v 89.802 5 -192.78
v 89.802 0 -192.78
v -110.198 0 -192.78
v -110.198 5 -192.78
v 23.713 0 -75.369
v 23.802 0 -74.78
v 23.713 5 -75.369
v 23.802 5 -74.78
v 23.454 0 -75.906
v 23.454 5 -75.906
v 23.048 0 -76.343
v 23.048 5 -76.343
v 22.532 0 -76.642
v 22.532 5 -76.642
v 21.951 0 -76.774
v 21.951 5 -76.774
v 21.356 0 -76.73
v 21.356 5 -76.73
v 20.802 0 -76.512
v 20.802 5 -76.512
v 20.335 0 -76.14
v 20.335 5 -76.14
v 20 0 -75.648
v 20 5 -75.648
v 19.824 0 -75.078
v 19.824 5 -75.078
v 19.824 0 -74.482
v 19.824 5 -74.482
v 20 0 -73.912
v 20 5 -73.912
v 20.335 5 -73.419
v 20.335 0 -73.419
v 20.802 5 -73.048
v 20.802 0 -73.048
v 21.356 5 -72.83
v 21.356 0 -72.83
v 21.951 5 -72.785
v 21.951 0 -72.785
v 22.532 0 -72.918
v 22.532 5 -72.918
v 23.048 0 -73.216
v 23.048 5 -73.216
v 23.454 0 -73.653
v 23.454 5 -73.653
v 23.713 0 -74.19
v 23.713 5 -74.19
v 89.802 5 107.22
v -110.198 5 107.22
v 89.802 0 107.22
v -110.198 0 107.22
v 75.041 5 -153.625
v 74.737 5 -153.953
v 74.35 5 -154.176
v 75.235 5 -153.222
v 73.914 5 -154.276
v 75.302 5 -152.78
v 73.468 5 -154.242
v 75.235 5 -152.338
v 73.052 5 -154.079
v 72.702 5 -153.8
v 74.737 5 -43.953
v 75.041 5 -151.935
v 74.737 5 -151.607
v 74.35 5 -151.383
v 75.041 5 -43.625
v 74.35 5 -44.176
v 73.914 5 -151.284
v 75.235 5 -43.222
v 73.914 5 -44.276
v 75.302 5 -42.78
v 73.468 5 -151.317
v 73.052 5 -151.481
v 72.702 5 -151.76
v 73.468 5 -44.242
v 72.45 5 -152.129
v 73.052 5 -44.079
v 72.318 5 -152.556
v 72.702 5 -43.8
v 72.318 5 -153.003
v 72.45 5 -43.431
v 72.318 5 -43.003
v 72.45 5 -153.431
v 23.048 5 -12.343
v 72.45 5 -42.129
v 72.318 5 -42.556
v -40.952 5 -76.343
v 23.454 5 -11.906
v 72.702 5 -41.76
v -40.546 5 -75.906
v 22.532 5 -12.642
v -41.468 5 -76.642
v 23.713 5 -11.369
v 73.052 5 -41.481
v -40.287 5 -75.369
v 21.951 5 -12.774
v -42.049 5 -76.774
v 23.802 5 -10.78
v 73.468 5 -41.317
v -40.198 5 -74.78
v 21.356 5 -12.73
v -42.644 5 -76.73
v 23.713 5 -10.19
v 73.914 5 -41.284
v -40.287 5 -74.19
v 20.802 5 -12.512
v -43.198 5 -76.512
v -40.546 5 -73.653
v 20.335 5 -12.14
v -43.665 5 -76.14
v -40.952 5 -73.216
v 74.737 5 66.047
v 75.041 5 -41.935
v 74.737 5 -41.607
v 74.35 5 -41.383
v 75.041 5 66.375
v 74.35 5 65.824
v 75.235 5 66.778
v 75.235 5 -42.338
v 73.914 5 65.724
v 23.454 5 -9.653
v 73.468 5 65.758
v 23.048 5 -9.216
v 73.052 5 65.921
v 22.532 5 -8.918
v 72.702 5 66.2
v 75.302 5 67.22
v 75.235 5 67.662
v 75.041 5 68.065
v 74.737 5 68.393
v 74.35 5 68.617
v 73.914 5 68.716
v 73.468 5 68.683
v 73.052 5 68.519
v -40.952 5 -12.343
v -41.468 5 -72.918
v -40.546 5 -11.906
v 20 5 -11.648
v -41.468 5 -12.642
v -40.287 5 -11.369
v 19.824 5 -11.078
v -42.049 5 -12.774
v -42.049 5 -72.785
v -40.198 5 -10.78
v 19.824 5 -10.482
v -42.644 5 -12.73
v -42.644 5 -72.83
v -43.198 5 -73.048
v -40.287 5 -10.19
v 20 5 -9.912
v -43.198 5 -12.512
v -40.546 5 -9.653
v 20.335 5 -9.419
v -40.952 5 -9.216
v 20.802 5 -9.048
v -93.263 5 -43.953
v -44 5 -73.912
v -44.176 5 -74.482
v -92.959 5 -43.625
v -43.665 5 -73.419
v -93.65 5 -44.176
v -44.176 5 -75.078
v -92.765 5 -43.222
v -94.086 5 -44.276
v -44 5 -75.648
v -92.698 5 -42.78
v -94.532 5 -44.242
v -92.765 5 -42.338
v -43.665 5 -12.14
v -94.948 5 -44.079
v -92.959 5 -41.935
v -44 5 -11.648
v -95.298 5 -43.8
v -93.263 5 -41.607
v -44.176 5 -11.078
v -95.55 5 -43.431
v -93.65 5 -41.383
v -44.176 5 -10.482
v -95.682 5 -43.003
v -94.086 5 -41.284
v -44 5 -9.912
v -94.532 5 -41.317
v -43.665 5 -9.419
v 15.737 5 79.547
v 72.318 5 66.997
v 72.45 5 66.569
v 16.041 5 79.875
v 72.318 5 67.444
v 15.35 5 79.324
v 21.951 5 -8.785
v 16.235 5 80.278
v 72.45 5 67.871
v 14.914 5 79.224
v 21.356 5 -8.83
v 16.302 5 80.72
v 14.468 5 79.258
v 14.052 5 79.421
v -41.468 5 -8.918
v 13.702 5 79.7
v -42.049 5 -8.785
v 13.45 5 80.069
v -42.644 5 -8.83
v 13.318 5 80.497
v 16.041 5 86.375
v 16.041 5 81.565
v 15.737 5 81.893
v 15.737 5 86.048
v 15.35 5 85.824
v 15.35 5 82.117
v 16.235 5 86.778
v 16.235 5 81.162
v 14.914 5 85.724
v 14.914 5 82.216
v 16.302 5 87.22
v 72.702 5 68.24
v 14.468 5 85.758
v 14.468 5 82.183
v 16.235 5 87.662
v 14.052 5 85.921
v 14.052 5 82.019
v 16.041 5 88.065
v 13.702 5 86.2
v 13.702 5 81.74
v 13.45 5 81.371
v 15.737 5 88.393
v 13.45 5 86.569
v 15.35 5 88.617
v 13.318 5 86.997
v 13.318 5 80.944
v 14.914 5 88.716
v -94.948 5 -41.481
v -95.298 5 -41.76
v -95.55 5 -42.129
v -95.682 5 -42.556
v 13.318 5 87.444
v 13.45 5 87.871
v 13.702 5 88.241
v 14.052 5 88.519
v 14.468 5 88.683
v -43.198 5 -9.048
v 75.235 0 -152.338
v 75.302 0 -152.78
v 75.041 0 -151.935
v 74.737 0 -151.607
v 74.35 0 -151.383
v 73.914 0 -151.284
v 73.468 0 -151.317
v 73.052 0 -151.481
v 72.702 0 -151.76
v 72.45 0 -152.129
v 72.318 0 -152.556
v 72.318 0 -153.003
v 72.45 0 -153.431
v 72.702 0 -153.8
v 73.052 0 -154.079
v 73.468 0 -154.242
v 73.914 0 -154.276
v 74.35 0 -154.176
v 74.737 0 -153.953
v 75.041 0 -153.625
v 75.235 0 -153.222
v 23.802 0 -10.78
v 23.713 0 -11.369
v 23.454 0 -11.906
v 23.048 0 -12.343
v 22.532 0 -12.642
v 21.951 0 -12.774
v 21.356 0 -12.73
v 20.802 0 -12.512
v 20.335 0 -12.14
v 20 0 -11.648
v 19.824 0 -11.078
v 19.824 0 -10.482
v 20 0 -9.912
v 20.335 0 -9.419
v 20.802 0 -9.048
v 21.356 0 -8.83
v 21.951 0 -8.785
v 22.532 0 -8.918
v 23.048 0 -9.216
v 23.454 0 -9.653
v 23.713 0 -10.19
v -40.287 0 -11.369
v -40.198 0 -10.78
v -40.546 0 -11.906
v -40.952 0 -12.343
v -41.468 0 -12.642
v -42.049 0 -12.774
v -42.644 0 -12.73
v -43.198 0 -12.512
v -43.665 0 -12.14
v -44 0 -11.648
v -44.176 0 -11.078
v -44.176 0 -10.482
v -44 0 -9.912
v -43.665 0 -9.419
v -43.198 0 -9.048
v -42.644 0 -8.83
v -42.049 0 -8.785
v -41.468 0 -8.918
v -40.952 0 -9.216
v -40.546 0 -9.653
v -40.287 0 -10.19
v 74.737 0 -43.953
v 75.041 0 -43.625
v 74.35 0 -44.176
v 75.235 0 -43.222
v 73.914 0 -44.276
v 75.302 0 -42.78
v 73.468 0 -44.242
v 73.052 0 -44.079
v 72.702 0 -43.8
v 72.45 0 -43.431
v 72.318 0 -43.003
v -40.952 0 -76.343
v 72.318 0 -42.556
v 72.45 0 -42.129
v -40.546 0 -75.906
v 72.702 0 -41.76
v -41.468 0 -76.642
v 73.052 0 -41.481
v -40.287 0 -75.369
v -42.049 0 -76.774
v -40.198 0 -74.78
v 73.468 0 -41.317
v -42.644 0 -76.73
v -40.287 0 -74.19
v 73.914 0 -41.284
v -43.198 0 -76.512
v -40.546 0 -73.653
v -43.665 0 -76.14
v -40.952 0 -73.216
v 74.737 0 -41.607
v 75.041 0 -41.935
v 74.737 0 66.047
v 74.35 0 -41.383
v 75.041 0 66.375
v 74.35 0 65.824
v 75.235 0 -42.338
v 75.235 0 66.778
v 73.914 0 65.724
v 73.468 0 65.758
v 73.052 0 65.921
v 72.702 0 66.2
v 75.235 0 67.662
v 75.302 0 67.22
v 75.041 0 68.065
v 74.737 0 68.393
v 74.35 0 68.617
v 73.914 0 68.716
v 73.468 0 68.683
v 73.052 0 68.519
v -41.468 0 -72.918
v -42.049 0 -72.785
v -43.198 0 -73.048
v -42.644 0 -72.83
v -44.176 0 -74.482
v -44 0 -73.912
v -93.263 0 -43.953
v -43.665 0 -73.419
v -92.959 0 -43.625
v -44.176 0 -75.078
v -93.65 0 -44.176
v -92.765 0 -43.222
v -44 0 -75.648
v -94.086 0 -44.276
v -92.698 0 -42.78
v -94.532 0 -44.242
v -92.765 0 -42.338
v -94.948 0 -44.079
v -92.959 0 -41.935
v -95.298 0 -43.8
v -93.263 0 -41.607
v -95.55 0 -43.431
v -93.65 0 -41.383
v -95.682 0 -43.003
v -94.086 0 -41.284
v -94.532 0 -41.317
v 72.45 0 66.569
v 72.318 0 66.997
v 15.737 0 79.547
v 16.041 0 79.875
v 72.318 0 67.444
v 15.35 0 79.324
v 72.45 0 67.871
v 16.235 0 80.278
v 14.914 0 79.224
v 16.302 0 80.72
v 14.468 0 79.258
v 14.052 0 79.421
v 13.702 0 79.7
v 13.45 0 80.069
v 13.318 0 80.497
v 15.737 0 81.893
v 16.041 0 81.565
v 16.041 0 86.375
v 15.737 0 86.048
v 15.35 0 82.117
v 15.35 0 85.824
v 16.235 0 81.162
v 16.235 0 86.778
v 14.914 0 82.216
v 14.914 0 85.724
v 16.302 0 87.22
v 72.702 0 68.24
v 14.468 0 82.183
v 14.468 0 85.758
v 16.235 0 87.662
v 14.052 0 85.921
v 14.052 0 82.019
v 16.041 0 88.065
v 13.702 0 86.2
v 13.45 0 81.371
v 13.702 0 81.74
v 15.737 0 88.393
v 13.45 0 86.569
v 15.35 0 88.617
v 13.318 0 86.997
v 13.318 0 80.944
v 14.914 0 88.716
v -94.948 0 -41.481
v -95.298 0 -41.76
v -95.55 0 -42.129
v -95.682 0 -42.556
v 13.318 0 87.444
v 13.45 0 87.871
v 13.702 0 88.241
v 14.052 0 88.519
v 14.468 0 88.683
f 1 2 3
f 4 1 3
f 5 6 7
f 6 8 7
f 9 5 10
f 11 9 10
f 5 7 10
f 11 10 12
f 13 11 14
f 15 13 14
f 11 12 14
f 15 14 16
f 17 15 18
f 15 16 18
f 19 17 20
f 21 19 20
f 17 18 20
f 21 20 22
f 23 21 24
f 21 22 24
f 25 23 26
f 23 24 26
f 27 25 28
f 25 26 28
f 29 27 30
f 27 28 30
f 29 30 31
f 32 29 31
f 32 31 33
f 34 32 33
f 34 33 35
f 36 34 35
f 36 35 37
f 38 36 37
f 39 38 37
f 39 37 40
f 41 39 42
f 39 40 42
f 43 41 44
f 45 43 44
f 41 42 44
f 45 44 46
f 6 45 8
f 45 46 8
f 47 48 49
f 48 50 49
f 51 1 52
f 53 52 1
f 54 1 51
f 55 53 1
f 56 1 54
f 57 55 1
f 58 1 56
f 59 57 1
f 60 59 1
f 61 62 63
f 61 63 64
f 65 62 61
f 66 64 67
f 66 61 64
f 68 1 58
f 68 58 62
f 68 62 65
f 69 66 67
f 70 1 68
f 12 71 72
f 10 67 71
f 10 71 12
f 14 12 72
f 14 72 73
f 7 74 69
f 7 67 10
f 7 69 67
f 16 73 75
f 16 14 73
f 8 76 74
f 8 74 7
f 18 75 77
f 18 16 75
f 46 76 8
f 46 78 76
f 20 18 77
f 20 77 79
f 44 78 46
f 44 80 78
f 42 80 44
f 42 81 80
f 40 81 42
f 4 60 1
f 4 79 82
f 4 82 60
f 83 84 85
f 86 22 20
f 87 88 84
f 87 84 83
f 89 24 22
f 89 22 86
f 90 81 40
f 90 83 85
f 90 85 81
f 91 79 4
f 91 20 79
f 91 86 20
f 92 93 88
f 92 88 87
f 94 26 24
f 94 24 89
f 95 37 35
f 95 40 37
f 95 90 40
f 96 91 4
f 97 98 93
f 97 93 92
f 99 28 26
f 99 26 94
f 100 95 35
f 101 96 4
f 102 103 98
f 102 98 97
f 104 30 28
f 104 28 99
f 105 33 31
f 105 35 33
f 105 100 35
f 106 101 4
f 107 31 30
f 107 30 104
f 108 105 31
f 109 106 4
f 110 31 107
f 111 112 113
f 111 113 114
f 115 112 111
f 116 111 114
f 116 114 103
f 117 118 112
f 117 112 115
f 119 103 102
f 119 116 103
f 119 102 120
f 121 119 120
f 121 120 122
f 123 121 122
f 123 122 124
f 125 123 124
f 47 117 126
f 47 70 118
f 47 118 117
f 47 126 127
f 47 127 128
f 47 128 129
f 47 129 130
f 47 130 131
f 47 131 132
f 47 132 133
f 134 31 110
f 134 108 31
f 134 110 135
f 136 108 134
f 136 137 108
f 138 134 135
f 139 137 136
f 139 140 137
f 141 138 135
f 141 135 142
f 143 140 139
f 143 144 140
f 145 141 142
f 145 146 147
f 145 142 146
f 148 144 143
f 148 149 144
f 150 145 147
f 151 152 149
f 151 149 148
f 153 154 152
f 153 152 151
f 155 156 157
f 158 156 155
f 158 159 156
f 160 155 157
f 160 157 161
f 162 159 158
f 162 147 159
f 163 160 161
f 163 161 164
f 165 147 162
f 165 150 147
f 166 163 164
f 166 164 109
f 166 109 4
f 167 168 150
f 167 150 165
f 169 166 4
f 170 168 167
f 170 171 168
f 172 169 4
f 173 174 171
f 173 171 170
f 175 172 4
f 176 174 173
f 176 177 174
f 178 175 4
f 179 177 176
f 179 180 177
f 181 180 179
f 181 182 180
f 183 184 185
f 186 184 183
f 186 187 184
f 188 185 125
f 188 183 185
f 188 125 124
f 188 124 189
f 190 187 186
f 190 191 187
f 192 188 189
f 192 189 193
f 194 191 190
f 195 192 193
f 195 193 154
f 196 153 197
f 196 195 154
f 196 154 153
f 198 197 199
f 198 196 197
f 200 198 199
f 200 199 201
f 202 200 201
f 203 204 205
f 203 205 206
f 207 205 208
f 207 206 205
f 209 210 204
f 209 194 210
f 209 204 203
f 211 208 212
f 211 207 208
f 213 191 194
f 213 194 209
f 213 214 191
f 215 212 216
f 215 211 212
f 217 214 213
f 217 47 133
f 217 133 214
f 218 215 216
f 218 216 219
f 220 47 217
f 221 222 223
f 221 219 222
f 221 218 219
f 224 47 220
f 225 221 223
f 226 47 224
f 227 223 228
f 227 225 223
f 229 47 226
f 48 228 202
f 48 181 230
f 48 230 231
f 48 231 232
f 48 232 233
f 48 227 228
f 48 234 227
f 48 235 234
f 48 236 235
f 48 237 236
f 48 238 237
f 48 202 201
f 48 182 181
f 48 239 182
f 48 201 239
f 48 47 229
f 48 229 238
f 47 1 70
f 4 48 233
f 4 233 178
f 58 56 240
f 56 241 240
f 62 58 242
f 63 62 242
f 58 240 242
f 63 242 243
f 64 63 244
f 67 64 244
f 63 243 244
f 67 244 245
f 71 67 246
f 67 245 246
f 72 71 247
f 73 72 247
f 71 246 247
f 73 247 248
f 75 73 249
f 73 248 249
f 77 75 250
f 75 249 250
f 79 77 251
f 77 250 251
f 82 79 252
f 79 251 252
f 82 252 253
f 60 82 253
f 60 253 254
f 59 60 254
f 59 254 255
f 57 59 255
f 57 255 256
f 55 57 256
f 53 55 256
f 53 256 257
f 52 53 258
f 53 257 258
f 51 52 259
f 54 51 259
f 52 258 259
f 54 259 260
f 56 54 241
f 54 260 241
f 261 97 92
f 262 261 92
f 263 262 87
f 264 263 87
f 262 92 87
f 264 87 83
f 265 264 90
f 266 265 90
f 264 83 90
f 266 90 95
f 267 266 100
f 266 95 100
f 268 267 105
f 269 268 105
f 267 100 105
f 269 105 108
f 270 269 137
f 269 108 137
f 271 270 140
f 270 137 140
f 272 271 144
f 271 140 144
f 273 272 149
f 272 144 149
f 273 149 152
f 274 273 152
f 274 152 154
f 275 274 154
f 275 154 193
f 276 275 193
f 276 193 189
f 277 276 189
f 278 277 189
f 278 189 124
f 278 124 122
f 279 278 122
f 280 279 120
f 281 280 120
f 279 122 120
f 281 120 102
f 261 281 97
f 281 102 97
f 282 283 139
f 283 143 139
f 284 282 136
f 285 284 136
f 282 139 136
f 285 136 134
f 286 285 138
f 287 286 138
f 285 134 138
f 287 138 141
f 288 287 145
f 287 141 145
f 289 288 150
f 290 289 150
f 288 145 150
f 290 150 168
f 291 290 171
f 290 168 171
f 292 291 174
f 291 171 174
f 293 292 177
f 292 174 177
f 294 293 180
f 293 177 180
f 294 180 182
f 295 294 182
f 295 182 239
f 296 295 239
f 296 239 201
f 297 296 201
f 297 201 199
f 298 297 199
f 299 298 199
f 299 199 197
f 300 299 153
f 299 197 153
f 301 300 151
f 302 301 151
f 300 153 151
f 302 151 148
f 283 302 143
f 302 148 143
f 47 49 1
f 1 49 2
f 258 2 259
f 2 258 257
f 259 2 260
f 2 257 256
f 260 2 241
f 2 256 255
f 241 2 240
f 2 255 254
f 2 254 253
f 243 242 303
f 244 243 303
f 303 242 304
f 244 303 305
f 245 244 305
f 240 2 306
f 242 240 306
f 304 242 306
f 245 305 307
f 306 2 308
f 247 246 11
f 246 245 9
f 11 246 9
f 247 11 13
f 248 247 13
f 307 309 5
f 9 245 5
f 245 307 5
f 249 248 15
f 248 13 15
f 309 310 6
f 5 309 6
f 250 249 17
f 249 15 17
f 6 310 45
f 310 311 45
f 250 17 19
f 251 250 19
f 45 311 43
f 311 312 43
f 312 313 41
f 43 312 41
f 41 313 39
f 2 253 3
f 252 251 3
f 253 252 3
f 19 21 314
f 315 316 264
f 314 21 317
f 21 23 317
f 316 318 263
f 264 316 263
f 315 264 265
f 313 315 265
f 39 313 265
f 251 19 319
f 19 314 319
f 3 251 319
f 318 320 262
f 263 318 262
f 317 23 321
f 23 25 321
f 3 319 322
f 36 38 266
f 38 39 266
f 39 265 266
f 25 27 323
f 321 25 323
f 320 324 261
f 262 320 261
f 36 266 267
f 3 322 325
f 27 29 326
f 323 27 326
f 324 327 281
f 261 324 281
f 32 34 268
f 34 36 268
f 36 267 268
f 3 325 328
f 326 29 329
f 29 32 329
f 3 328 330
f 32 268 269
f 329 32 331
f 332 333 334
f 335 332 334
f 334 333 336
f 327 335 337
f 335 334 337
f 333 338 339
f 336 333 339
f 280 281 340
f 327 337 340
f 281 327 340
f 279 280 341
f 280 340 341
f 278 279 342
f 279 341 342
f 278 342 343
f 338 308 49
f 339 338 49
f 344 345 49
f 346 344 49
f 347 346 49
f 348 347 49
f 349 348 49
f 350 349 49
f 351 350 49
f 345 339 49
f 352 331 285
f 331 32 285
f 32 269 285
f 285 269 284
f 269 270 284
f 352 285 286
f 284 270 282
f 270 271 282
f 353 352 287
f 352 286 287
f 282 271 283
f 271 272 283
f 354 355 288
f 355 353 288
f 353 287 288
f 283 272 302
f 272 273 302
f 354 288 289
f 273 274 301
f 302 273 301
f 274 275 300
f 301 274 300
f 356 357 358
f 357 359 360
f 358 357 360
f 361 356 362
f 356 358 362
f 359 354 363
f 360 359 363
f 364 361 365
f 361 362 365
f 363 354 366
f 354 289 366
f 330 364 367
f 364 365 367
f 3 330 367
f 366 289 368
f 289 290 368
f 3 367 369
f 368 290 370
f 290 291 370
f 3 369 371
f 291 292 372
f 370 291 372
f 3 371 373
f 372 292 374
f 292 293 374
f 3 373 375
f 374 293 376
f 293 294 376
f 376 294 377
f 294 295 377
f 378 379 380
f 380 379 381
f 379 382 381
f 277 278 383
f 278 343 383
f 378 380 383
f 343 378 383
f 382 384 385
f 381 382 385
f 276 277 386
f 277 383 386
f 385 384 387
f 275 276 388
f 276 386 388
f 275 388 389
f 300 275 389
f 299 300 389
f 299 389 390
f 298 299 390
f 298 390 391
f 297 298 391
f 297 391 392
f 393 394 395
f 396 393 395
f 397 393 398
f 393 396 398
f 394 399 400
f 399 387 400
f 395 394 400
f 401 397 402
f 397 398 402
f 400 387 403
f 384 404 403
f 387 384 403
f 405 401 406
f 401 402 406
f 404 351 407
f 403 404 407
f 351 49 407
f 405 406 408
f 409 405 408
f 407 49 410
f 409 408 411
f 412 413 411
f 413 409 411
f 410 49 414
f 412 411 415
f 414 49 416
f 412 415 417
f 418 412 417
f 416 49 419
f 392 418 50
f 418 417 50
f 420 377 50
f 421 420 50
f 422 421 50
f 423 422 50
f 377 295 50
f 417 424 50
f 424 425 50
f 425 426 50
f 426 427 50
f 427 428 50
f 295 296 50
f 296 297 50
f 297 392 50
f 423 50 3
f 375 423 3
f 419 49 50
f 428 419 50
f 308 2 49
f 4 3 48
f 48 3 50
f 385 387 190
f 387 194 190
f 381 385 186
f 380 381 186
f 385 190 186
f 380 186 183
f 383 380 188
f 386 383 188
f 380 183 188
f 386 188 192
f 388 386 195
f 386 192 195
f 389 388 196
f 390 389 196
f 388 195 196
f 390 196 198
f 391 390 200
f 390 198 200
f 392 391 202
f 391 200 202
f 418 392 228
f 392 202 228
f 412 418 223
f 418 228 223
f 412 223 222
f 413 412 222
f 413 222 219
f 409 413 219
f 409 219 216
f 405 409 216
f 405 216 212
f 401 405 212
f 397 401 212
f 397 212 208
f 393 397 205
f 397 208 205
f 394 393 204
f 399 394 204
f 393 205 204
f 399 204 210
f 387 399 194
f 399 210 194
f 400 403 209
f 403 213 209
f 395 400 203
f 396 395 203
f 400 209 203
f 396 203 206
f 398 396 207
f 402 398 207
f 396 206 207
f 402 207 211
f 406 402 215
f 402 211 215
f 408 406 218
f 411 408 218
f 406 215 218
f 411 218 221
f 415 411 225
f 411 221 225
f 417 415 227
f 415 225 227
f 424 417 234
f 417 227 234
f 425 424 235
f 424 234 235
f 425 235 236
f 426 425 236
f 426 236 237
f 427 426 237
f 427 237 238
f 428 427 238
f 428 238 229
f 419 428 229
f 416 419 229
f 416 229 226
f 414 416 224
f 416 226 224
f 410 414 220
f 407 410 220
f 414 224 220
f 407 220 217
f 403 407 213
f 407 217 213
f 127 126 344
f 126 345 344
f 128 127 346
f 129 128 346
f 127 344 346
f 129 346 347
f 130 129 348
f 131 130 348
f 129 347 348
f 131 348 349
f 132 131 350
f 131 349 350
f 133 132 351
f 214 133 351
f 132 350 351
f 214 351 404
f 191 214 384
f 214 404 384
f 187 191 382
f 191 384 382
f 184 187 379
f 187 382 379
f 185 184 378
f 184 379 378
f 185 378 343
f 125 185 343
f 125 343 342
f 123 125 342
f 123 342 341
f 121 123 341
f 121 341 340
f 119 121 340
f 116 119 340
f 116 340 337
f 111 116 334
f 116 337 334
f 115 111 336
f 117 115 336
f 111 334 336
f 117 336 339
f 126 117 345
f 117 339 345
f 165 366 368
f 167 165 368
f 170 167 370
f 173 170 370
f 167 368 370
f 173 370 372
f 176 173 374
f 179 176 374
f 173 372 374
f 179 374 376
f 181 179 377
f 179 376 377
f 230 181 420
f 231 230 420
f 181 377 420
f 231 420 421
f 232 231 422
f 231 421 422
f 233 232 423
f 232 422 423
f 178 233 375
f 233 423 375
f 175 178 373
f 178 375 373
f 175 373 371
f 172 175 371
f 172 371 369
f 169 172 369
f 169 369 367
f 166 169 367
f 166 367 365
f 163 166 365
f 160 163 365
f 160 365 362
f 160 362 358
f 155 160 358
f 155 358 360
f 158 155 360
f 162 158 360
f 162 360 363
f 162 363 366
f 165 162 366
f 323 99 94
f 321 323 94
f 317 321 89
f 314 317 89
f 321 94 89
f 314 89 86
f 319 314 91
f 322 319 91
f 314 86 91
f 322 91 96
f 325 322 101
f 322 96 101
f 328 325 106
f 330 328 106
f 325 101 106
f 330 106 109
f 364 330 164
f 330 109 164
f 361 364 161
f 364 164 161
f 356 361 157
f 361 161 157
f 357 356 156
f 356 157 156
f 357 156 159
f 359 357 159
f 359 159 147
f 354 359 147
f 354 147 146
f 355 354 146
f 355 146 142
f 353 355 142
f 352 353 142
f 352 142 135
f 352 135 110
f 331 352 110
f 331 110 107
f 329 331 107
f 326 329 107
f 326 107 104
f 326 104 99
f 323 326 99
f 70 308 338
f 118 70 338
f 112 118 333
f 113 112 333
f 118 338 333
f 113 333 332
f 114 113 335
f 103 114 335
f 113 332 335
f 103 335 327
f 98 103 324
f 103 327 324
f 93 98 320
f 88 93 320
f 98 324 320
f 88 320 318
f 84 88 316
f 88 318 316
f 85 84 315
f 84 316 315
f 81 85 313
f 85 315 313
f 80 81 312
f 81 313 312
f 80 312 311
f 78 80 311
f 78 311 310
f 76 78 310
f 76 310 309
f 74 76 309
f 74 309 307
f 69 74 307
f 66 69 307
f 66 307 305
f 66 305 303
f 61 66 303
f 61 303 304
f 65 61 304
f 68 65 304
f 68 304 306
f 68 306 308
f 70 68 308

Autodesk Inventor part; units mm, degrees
ref_plane "YZ Plane" through (0, 0, 0) normal (1, 0, 0) x (0, 1, 0)
ref_plane "XZ Plane" through (0, 0, 0) normal (0, 1, 0) x (-1, 0, 0)
ref_plane "XY Plane" through (0, 0, 0) normal (0, 0, 1) x (1, 0, 0)
sketch "Esquisse1" plane through (0, 0, 0) normal (0, 1, 0) x (-1, 0, 0)
  line L0 (110.1985, 107.2202) -> (-89.8015, 107.2202)
  line L1 (-89.8015, 107.2202) -> (-89.8015, -192.7798)
  line L2 (-89.8015, -192.7798) -> (110.1985, -192.7798)
  line L3 (110.1985, -192.7798) -> (110.1985, 107.2202)
  point P0 (0, 0)
  dimension "d0" = 300
  dimension "d1" = 200
extrude "Extrusion1" add sketch "Esquisse1" along normal blind 5
sketch "Esquisse2" plane through (0, 0, 0) normal (0, -1, 0) x (1, 0, 0)
  circle A0 centre (-94.1985, -42.7798) radius 1.5
  circle A1 centre (73.8015, -42.7798) radius 1.5
  circle A2 centre (73.8015, 67.2202) radius 1.5
  circle A3 centre (73.8015, -152.7798) radius 1.5
  line L0 (-110.1985, -192.7798) -> (-110.1985, 107.2202) projected
  line L1 (89.8015, -192.7798) -> (-110.1985, -192.7798) projected
  line L2 (89.8015, 107.2202) -> (89.8015, -192.7798) projected
  line L3 (-110.1985, 107.2202) -> (89.8015, 107.2202) projected
  point P0 (0, 0)
  dimension "d4" = 16
  dimension "d5" = 150
  dimension "d6" = 16
  dimension "d7" = 16
  dimension "d8" = 16
  dimension "d9" = 40
  dimension "d10" = 150
  dimension "d11" = 40
extrude "Extrusion2" cut sketch "Esquisse2" against normal through all contours A0 | A1 | A2 | A3
sketch "Sketch4" plane through (0, 5, 0) normal (0, 1, 0) x (1, 0, 0)
  circle A0 centre (14.8015, -80.7202) radius 1.5 projected
  circle A1 centre (14.8015, -87.2203) radius 1.5 projected
  circle A2 centre (21.8015, 10.7798) radius 2 projected
  circle A3 centre (-42.1985, 10.7798) radius 2 projected
  circle A4 centre (-42.1985, 74.7798) radius 2 projected
  circle A5 centre (21.8015, 74.7798) radius 2 projected
  point P0 (0, 0)
extrude "Extrusion4" cut sketch "Sketch4" against normal through all
properties part number "toit"
